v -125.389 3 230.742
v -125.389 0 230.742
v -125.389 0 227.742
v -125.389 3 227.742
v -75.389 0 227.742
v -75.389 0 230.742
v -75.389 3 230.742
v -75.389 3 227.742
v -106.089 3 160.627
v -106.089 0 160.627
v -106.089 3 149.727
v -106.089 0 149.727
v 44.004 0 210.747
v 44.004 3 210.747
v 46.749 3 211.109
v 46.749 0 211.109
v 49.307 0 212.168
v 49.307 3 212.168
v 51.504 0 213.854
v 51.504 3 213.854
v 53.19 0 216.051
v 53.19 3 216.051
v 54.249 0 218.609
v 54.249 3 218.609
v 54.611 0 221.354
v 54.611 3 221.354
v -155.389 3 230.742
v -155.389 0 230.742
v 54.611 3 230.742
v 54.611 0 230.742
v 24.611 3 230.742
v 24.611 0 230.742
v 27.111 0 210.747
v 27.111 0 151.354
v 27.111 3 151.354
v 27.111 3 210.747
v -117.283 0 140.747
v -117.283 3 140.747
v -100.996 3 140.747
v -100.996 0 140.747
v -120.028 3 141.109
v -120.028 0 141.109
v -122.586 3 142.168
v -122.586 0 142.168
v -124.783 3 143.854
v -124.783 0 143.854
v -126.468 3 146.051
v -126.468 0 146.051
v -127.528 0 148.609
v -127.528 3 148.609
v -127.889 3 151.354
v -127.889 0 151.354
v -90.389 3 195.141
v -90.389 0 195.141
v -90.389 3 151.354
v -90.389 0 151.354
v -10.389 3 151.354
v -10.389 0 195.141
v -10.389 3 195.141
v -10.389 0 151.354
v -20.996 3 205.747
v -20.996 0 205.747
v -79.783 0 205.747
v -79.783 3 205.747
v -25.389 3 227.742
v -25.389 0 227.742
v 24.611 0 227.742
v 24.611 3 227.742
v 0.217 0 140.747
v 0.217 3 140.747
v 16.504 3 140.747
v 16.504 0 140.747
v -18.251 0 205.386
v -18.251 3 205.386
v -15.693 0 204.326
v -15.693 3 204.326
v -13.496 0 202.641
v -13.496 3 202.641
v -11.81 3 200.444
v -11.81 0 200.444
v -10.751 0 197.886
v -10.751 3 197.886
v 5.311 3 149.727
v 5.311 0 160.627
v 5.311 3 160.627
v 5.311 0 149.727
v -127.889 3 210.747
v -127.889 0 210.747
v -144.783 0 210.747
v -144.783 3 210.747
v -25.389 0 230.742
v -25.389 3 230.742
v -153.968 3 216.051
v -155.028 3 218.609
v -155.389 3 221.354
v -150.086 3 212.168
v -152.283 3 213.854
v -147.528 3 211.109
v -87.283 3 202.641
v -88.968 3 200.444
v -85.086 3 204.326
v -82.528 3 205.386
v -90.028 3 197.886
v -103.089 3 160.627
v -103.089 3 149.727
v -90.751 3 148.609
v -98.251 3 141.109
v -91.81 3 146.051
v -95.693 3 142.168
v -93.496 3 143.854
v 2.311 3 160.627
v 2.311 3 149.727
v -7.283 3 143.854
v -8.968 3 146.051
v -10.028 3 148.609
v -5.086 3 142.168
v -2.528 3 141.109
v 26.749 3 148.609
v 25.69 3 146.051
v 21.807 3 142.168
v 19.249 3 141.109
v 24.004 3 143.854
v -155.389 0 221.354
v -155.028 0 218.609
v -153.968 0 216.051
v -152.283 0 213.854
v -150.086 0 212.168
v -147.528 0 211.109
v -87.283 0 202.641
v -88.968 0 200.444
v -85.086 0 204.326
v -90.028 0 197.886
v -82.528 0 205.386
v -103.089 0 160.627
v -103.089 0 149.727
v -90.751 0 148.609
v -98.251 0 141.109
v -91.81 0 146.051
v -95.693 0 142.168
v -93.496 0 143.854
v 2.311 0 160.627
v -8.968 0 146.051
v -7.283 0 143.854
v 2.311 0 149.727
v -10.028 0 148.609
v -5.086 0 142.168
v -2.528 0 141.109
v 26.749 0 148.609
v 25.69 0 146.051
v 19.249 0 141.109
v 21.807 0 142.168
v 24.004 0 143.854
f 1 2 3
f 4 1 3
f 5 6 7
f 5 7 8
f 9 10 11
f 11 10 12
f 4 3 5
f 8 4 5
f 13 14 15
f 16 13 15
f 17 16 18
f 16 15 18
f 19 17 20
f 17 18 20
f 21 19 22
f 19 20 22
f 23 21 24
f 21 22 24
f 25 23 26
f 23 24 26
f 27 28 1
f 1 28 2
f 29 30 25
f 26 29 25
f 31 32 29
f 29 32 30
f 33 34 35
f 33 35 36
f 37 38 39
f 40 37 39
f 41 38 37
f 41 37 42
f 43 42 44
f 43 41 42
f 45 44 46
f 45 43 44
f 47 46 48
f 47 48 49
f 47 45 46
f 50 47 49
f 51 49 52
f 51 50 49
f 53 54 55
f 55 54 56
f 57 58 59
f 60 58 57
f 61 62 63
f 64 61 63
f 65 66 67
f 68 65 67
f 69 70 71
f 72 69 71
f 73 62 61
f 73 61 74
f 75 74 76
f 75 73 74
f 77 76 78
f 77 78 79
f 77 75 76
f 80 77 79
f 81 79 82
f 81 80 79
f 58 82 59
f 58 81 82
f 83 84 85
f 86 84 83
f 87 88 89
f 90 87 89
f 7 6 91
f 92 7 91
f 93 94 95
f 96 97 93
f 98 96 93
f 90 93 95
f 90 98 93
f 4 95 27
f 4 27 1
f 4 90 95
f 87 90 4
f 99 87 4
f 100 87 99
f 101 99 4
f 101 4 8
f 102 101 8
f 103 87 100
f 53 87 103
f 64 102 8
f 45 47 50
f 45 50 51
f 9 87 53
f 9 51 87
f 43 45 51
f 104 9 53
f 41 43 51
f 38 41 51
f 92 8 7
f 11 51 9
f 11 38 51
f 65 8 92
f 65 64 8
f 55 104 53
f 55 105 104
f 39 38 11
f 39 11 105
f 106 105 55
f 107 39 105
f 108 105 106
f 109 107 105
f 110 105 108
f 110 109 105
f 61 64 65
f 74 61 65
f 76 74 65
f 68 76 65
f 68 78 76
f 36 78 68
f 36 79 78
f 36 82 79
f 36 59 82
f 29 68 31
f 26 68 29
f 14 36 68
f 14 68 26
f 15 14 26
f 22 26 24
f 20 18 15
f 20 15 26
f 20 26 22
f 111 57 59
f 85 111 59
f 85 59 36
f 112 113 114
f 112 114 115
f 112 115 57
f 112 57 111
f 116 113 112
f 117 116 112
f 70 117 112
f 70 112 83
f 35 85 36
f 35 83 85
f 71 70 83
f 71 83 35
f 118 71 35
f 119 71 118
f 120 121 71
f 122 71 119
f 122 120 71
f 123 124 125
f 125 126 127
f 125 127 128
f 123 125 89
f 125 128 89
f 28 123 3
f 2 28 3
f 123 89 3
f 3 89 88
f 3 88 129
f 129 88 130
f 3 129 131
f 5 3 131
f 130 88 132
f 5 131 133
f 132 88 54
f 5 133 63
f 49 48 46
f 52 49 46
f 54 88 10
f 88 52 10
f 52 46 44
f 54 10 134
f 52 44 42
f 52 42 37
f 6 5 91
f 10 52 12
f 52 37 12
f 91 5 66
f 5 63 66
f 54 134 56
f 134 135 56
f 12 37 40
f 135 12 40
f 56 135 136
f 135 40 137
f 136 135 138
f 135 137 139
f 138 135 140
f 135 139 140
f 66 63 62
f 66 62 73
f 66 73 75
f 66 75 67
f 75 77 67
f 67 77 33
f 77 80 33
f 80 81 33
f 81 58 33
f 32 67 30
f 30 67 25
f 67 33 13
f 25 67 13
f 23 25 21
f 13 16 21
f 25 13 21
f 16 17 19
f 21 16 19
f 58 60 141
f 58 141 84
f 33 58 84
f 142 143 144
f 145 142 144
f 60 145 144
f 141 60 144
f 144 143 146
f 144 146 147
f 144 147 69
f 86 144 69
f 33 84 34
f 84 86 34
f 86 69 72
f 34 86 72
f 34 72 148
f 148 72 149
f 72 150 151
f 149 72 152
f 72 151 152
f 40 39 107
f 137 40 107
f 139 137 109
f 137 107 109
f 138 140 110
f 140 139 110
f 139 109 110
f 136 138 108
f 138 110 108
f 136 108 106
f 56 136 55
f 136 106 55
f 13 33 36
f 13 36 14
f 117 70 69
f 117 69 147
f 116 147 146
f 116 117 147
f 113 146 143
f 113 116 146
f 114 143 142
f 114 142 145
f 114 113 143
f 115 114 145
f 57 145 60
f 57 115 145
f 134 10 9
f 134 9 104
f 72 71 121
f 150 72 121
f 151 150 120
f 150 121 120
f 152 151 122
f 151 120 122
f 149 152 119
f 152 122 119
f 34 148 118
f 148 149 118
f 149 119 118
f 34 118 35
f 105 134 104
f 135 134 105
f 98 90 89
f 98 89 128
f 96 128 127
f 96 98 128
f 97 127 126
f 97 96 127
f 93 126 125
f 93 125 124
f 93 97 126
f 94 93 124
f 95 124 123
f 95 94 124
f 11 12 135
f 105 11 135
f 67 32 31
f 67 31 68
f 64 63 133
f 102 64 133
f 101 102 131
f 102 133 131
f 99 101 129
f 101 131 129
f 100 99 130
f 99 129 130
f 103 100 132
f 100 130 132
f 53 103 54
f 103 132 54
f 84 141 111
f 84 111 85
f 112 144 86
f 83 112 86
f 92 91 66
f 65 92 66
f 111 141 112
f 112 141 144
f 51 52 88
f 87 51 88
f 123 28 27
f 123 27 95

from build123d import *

# Parameters (mm, degrees)
SKETCH1_W                       = 210
SKETCH1_H                       = 120
CHASIS_BASE_DEPTH               = 3
FRONT_AND_BACK_SLOTS_DEPTH      = 279.202975413
FRONT_AND_BACK_SLOTS_DEPTH_BACK = 279.202975413
SKETCH7_W                       = 50
SKETCH7_H                       = 3
BACK_WHEELS_DEPTH               = 279.202975413
BACK_WHEELS_DEPTH_BACK          = 279.202975413
CUT_EXTRUDE1_DEPTH              = 279.202975413
CUT_EXTRUDE1_DEPTH_BACK         = 279.202975413
SKETCH16_W                      = 3
SKETCH16_H                      = 10.9
SKETCH17_W                      = 210
SKETCH17_H                      = 30.004914443
CUT_EXTRUDE2_DEPTH              = 10
SKETCH18_W                      = 80
SKETCH18_H                      = 65
CUT_EXTRUDE3_DEPTH              = 57
CUT_EXTRUDE4_DEPTH              = 10
BOSS_EXTRUDE1_DEPTH             = 3


with BuildPart() as part:
    # Sketch1 → Chasis Base (new body)
    with BuildSketch(Plane(origin=(0, 0, 0), x_dir=(1, 0, 0), z_dir=(0, 1, 0))):
        with Locations((-50.389260457, -170.742439233)):
            Rectangle(SKETCH1_W, SKETCH1_H)
    extrude(amount=CHASIS_BASE_DEPTH)

    # Sketch7 → Front and Back Slots (cut, two sides: drawn at the far end of the back side and taken through both)
    with BuildSketch(Plane(origin=(0, 3, 0), x_dir=(1, 0, 0), z_dir=(0, 1, 0)).offset(-FRONT_AND_BACK_SLOTS_DEPTH_BACK)):
        with Locations((-0.389260457, -229.242439233)):
            Rectangle(SKETCH7_W, SKETCH7_H)
        with Locations((-100.389260457, -229.242439233)):
            Rectangle(SKETCH7_W, SKETCH7_H)
    extrude(amount=FRONT_AND_BACK_SLOTS_DEPTH + FRONT_AND_BACK_SLOTS_DEPTH_BACK, mode=Mode.SUBTRACT)

    # Sketch15 → Back Wheels (cut, two sides: drawn at the far end of the back side and taken through both)
    with BuildSketch(Plane(origin=(0, 3, 0), x_dir=(1, 0, 0), z_dir=(0, 1, 0)).offset(-BACK_WHEELS_DEPTH_BACK)):
        Polygon((-155.389260457, -175.747353676), (-155.389260457, -140.747353676), (-127.889260457, -140.747353676), (-127.889260457, -210.747353676), (-155.389260457, -210.747353676), align=None)
        Polygon((54.610739543, -140.747353676), (27.110739543, -140.747353676), (27.110739543, -210.747353676), (54.610739543, -210.747353676), (54.610739543, -175.747353676), align=None)
    extrude(amount=BACK_WHEELS_DEPTH + BACK_WHEELS_DEPTH_BACK, mode=Mode.SUBTRACT)

    # Sketch16 → Cut-Extrude1 (cut, two sides: drawn at the far end of the back side and taken through both)
    with BuildSketch(Plane(origin=(0, 3, 0), x_dir=(1, 0, 0), z_dir=(0, 1, 0)).offset(-CUT_EXTRUDE1_DEPTH_BACK)):
        with Locations((-104.589260457, -155.177353676)):
            Rectangle(SKETCH16_W, SKETCH16_H)
        with Locations((3.810739543, -155.177353676)):
            Rectangle(SKETCH16_W, SKETCH16_H)
    extrude(amount=CUT_EXTRUDE1_DEPTH + CUT_EXTRUDE1_DEPTH_BACK, mode=Mode.SUBTRACT)

    # Sketch17 → Cut-Extrude2 (cut)
    with BuildSketch(Plane(origin=(0, 3, 0), x_dir=(1, 0, 0), z_dir=(0, 1, 0))):
        with Locations((-50.389260457, -125.744896455)):
            Rectangle(SKETCH17_W, SKETCH17_H)
    extrude(amount=-CUT_EXTRUDE2_DEPTH, mode=Mode.SUBTRACT)

    # Sketch18 → Cut-Extrude3 (cut)
    with BuildSketch(Plane(origin=(0, 0, 0), x_dir=(-1, 0, 0), z_dir=(0, -1, 0))):
        with Locations((50.389260457, -173.247353676)):
            Rectangle(SKETCH18_W, SKETCH18_H)
    extrude(amount=-CUT_EXTRUDE3_DEPTH, mode=Mode.SUBTRACT)

    # Sketch19 → Cut-Extrude4 (cut)
    with BuildSketch(Plane(origin=(0, 3, 0), x_dir=(1, 0, 0), z_dir=(0, 1, 0))):
        with BuildLine():
            Line((-155.389260457, -221.353955394), (-155.389260457, -210.747353676))
            Line((-155.389260457, -210.747353676), (-144.782658739, -210.747353676))
            ThreePointArc((-144.782658739, -210.747353676), (-152.282658739, -213.853955394), (-155.389260457, -221.353955394))
        make_face()
        with BuildLine():
            Line((-127.889260457, -140.747353676), (-117.282658739, -140.747353676))
            ThreePointArc((-117.282658739, -140.747353676), (-124.782658739, -143.853955394), (-127.889260457, -151.353955394))
            Line((-127.889260457, -151.353955394), (-127.889260457, -140.747353676))
        make_face()
        with BuildLine():
            Line((-90.389260457, -151.353955394), (-90.389260457, -140.747353676))
            Line((-90.389260457, -140.747353676), (-100.995862174, -140.747353676))
            ThreePointArc((-100.995862174, -140.747353676), (-93.495862174, -143.853955394), (-90.389260457, -151.353955394))
        make_face()
        with BuildLine():
            Line((-10.389260457, -140.747353676), (0.217341261, -140.747353676))
            ThreePointArc((0.217341261, -140.747353676), (-7.282658739, -143.853955394), (-10.389260457, -151.353955394))
            Line((-10.389260457, -151.353955394), (-10.389260457, -140.747353676))
        make_face()
        with BuildLine():
            Line((27.110739543, -151.353955394), (27.110739543, -140.747353676))
            Line((27.110739543, -140.747353676), (16.504137826, -140.747353676))
            ThreePointArc((16.504137826, -140.747353676), (24.004137826, -143.853955394), (27.110739543, -151.353955394))
        make_face()
        with BuildLine():
            Line((54.610739543, -210.747353676), (44.004137826, -210.747353676))
            ThreePointArc((44.004137826, -210.747353676), (51.504137826, -213.853955394), (54.610739543, -221.353955394))
            Line((54.610739543, -221.353955394), (54.610739543, -210.747353676))
        make_face()
    extrude(amount=-CUT_EXTRUDE4_DEPTH, mode=Mode.SUBTRACT)

    # Sketch20 → Boss-Extrude1 (add)
    with BuildSketch(Plane(origin=(0, 0, 0), x_dir=(1, 0, 0), z_dir=(0, 1, 0))):
        with BuildLine():
            Line((-90.389260457, -195.140751958), (-90.389260457, -205.747353676))
            Line((-90.389260457, -205.747353676), (-79.782658739, -205.747353676))
            ThreePointArc((-79.782658739, -205.747353676), (-87.282658739, -202.640751958), (-90.389260457, -195.140751958))
        make_face()
        with BuildLine():
            Line((-10.389260457, -205.747353676), (-20.995862174, -205.747353676))
            ThreePointArc((-20.995862174, -205.747353676), (-13.495862174, -202.640751958), (-10.389260457, -195.140751958))
            Line((-10.389260457, -195.140751958), (-10.389260457, -205.747353676))
        make_face()
    extrude(amount=BOSS_EXTRUDE1_DEPTH)


solid = part.part
